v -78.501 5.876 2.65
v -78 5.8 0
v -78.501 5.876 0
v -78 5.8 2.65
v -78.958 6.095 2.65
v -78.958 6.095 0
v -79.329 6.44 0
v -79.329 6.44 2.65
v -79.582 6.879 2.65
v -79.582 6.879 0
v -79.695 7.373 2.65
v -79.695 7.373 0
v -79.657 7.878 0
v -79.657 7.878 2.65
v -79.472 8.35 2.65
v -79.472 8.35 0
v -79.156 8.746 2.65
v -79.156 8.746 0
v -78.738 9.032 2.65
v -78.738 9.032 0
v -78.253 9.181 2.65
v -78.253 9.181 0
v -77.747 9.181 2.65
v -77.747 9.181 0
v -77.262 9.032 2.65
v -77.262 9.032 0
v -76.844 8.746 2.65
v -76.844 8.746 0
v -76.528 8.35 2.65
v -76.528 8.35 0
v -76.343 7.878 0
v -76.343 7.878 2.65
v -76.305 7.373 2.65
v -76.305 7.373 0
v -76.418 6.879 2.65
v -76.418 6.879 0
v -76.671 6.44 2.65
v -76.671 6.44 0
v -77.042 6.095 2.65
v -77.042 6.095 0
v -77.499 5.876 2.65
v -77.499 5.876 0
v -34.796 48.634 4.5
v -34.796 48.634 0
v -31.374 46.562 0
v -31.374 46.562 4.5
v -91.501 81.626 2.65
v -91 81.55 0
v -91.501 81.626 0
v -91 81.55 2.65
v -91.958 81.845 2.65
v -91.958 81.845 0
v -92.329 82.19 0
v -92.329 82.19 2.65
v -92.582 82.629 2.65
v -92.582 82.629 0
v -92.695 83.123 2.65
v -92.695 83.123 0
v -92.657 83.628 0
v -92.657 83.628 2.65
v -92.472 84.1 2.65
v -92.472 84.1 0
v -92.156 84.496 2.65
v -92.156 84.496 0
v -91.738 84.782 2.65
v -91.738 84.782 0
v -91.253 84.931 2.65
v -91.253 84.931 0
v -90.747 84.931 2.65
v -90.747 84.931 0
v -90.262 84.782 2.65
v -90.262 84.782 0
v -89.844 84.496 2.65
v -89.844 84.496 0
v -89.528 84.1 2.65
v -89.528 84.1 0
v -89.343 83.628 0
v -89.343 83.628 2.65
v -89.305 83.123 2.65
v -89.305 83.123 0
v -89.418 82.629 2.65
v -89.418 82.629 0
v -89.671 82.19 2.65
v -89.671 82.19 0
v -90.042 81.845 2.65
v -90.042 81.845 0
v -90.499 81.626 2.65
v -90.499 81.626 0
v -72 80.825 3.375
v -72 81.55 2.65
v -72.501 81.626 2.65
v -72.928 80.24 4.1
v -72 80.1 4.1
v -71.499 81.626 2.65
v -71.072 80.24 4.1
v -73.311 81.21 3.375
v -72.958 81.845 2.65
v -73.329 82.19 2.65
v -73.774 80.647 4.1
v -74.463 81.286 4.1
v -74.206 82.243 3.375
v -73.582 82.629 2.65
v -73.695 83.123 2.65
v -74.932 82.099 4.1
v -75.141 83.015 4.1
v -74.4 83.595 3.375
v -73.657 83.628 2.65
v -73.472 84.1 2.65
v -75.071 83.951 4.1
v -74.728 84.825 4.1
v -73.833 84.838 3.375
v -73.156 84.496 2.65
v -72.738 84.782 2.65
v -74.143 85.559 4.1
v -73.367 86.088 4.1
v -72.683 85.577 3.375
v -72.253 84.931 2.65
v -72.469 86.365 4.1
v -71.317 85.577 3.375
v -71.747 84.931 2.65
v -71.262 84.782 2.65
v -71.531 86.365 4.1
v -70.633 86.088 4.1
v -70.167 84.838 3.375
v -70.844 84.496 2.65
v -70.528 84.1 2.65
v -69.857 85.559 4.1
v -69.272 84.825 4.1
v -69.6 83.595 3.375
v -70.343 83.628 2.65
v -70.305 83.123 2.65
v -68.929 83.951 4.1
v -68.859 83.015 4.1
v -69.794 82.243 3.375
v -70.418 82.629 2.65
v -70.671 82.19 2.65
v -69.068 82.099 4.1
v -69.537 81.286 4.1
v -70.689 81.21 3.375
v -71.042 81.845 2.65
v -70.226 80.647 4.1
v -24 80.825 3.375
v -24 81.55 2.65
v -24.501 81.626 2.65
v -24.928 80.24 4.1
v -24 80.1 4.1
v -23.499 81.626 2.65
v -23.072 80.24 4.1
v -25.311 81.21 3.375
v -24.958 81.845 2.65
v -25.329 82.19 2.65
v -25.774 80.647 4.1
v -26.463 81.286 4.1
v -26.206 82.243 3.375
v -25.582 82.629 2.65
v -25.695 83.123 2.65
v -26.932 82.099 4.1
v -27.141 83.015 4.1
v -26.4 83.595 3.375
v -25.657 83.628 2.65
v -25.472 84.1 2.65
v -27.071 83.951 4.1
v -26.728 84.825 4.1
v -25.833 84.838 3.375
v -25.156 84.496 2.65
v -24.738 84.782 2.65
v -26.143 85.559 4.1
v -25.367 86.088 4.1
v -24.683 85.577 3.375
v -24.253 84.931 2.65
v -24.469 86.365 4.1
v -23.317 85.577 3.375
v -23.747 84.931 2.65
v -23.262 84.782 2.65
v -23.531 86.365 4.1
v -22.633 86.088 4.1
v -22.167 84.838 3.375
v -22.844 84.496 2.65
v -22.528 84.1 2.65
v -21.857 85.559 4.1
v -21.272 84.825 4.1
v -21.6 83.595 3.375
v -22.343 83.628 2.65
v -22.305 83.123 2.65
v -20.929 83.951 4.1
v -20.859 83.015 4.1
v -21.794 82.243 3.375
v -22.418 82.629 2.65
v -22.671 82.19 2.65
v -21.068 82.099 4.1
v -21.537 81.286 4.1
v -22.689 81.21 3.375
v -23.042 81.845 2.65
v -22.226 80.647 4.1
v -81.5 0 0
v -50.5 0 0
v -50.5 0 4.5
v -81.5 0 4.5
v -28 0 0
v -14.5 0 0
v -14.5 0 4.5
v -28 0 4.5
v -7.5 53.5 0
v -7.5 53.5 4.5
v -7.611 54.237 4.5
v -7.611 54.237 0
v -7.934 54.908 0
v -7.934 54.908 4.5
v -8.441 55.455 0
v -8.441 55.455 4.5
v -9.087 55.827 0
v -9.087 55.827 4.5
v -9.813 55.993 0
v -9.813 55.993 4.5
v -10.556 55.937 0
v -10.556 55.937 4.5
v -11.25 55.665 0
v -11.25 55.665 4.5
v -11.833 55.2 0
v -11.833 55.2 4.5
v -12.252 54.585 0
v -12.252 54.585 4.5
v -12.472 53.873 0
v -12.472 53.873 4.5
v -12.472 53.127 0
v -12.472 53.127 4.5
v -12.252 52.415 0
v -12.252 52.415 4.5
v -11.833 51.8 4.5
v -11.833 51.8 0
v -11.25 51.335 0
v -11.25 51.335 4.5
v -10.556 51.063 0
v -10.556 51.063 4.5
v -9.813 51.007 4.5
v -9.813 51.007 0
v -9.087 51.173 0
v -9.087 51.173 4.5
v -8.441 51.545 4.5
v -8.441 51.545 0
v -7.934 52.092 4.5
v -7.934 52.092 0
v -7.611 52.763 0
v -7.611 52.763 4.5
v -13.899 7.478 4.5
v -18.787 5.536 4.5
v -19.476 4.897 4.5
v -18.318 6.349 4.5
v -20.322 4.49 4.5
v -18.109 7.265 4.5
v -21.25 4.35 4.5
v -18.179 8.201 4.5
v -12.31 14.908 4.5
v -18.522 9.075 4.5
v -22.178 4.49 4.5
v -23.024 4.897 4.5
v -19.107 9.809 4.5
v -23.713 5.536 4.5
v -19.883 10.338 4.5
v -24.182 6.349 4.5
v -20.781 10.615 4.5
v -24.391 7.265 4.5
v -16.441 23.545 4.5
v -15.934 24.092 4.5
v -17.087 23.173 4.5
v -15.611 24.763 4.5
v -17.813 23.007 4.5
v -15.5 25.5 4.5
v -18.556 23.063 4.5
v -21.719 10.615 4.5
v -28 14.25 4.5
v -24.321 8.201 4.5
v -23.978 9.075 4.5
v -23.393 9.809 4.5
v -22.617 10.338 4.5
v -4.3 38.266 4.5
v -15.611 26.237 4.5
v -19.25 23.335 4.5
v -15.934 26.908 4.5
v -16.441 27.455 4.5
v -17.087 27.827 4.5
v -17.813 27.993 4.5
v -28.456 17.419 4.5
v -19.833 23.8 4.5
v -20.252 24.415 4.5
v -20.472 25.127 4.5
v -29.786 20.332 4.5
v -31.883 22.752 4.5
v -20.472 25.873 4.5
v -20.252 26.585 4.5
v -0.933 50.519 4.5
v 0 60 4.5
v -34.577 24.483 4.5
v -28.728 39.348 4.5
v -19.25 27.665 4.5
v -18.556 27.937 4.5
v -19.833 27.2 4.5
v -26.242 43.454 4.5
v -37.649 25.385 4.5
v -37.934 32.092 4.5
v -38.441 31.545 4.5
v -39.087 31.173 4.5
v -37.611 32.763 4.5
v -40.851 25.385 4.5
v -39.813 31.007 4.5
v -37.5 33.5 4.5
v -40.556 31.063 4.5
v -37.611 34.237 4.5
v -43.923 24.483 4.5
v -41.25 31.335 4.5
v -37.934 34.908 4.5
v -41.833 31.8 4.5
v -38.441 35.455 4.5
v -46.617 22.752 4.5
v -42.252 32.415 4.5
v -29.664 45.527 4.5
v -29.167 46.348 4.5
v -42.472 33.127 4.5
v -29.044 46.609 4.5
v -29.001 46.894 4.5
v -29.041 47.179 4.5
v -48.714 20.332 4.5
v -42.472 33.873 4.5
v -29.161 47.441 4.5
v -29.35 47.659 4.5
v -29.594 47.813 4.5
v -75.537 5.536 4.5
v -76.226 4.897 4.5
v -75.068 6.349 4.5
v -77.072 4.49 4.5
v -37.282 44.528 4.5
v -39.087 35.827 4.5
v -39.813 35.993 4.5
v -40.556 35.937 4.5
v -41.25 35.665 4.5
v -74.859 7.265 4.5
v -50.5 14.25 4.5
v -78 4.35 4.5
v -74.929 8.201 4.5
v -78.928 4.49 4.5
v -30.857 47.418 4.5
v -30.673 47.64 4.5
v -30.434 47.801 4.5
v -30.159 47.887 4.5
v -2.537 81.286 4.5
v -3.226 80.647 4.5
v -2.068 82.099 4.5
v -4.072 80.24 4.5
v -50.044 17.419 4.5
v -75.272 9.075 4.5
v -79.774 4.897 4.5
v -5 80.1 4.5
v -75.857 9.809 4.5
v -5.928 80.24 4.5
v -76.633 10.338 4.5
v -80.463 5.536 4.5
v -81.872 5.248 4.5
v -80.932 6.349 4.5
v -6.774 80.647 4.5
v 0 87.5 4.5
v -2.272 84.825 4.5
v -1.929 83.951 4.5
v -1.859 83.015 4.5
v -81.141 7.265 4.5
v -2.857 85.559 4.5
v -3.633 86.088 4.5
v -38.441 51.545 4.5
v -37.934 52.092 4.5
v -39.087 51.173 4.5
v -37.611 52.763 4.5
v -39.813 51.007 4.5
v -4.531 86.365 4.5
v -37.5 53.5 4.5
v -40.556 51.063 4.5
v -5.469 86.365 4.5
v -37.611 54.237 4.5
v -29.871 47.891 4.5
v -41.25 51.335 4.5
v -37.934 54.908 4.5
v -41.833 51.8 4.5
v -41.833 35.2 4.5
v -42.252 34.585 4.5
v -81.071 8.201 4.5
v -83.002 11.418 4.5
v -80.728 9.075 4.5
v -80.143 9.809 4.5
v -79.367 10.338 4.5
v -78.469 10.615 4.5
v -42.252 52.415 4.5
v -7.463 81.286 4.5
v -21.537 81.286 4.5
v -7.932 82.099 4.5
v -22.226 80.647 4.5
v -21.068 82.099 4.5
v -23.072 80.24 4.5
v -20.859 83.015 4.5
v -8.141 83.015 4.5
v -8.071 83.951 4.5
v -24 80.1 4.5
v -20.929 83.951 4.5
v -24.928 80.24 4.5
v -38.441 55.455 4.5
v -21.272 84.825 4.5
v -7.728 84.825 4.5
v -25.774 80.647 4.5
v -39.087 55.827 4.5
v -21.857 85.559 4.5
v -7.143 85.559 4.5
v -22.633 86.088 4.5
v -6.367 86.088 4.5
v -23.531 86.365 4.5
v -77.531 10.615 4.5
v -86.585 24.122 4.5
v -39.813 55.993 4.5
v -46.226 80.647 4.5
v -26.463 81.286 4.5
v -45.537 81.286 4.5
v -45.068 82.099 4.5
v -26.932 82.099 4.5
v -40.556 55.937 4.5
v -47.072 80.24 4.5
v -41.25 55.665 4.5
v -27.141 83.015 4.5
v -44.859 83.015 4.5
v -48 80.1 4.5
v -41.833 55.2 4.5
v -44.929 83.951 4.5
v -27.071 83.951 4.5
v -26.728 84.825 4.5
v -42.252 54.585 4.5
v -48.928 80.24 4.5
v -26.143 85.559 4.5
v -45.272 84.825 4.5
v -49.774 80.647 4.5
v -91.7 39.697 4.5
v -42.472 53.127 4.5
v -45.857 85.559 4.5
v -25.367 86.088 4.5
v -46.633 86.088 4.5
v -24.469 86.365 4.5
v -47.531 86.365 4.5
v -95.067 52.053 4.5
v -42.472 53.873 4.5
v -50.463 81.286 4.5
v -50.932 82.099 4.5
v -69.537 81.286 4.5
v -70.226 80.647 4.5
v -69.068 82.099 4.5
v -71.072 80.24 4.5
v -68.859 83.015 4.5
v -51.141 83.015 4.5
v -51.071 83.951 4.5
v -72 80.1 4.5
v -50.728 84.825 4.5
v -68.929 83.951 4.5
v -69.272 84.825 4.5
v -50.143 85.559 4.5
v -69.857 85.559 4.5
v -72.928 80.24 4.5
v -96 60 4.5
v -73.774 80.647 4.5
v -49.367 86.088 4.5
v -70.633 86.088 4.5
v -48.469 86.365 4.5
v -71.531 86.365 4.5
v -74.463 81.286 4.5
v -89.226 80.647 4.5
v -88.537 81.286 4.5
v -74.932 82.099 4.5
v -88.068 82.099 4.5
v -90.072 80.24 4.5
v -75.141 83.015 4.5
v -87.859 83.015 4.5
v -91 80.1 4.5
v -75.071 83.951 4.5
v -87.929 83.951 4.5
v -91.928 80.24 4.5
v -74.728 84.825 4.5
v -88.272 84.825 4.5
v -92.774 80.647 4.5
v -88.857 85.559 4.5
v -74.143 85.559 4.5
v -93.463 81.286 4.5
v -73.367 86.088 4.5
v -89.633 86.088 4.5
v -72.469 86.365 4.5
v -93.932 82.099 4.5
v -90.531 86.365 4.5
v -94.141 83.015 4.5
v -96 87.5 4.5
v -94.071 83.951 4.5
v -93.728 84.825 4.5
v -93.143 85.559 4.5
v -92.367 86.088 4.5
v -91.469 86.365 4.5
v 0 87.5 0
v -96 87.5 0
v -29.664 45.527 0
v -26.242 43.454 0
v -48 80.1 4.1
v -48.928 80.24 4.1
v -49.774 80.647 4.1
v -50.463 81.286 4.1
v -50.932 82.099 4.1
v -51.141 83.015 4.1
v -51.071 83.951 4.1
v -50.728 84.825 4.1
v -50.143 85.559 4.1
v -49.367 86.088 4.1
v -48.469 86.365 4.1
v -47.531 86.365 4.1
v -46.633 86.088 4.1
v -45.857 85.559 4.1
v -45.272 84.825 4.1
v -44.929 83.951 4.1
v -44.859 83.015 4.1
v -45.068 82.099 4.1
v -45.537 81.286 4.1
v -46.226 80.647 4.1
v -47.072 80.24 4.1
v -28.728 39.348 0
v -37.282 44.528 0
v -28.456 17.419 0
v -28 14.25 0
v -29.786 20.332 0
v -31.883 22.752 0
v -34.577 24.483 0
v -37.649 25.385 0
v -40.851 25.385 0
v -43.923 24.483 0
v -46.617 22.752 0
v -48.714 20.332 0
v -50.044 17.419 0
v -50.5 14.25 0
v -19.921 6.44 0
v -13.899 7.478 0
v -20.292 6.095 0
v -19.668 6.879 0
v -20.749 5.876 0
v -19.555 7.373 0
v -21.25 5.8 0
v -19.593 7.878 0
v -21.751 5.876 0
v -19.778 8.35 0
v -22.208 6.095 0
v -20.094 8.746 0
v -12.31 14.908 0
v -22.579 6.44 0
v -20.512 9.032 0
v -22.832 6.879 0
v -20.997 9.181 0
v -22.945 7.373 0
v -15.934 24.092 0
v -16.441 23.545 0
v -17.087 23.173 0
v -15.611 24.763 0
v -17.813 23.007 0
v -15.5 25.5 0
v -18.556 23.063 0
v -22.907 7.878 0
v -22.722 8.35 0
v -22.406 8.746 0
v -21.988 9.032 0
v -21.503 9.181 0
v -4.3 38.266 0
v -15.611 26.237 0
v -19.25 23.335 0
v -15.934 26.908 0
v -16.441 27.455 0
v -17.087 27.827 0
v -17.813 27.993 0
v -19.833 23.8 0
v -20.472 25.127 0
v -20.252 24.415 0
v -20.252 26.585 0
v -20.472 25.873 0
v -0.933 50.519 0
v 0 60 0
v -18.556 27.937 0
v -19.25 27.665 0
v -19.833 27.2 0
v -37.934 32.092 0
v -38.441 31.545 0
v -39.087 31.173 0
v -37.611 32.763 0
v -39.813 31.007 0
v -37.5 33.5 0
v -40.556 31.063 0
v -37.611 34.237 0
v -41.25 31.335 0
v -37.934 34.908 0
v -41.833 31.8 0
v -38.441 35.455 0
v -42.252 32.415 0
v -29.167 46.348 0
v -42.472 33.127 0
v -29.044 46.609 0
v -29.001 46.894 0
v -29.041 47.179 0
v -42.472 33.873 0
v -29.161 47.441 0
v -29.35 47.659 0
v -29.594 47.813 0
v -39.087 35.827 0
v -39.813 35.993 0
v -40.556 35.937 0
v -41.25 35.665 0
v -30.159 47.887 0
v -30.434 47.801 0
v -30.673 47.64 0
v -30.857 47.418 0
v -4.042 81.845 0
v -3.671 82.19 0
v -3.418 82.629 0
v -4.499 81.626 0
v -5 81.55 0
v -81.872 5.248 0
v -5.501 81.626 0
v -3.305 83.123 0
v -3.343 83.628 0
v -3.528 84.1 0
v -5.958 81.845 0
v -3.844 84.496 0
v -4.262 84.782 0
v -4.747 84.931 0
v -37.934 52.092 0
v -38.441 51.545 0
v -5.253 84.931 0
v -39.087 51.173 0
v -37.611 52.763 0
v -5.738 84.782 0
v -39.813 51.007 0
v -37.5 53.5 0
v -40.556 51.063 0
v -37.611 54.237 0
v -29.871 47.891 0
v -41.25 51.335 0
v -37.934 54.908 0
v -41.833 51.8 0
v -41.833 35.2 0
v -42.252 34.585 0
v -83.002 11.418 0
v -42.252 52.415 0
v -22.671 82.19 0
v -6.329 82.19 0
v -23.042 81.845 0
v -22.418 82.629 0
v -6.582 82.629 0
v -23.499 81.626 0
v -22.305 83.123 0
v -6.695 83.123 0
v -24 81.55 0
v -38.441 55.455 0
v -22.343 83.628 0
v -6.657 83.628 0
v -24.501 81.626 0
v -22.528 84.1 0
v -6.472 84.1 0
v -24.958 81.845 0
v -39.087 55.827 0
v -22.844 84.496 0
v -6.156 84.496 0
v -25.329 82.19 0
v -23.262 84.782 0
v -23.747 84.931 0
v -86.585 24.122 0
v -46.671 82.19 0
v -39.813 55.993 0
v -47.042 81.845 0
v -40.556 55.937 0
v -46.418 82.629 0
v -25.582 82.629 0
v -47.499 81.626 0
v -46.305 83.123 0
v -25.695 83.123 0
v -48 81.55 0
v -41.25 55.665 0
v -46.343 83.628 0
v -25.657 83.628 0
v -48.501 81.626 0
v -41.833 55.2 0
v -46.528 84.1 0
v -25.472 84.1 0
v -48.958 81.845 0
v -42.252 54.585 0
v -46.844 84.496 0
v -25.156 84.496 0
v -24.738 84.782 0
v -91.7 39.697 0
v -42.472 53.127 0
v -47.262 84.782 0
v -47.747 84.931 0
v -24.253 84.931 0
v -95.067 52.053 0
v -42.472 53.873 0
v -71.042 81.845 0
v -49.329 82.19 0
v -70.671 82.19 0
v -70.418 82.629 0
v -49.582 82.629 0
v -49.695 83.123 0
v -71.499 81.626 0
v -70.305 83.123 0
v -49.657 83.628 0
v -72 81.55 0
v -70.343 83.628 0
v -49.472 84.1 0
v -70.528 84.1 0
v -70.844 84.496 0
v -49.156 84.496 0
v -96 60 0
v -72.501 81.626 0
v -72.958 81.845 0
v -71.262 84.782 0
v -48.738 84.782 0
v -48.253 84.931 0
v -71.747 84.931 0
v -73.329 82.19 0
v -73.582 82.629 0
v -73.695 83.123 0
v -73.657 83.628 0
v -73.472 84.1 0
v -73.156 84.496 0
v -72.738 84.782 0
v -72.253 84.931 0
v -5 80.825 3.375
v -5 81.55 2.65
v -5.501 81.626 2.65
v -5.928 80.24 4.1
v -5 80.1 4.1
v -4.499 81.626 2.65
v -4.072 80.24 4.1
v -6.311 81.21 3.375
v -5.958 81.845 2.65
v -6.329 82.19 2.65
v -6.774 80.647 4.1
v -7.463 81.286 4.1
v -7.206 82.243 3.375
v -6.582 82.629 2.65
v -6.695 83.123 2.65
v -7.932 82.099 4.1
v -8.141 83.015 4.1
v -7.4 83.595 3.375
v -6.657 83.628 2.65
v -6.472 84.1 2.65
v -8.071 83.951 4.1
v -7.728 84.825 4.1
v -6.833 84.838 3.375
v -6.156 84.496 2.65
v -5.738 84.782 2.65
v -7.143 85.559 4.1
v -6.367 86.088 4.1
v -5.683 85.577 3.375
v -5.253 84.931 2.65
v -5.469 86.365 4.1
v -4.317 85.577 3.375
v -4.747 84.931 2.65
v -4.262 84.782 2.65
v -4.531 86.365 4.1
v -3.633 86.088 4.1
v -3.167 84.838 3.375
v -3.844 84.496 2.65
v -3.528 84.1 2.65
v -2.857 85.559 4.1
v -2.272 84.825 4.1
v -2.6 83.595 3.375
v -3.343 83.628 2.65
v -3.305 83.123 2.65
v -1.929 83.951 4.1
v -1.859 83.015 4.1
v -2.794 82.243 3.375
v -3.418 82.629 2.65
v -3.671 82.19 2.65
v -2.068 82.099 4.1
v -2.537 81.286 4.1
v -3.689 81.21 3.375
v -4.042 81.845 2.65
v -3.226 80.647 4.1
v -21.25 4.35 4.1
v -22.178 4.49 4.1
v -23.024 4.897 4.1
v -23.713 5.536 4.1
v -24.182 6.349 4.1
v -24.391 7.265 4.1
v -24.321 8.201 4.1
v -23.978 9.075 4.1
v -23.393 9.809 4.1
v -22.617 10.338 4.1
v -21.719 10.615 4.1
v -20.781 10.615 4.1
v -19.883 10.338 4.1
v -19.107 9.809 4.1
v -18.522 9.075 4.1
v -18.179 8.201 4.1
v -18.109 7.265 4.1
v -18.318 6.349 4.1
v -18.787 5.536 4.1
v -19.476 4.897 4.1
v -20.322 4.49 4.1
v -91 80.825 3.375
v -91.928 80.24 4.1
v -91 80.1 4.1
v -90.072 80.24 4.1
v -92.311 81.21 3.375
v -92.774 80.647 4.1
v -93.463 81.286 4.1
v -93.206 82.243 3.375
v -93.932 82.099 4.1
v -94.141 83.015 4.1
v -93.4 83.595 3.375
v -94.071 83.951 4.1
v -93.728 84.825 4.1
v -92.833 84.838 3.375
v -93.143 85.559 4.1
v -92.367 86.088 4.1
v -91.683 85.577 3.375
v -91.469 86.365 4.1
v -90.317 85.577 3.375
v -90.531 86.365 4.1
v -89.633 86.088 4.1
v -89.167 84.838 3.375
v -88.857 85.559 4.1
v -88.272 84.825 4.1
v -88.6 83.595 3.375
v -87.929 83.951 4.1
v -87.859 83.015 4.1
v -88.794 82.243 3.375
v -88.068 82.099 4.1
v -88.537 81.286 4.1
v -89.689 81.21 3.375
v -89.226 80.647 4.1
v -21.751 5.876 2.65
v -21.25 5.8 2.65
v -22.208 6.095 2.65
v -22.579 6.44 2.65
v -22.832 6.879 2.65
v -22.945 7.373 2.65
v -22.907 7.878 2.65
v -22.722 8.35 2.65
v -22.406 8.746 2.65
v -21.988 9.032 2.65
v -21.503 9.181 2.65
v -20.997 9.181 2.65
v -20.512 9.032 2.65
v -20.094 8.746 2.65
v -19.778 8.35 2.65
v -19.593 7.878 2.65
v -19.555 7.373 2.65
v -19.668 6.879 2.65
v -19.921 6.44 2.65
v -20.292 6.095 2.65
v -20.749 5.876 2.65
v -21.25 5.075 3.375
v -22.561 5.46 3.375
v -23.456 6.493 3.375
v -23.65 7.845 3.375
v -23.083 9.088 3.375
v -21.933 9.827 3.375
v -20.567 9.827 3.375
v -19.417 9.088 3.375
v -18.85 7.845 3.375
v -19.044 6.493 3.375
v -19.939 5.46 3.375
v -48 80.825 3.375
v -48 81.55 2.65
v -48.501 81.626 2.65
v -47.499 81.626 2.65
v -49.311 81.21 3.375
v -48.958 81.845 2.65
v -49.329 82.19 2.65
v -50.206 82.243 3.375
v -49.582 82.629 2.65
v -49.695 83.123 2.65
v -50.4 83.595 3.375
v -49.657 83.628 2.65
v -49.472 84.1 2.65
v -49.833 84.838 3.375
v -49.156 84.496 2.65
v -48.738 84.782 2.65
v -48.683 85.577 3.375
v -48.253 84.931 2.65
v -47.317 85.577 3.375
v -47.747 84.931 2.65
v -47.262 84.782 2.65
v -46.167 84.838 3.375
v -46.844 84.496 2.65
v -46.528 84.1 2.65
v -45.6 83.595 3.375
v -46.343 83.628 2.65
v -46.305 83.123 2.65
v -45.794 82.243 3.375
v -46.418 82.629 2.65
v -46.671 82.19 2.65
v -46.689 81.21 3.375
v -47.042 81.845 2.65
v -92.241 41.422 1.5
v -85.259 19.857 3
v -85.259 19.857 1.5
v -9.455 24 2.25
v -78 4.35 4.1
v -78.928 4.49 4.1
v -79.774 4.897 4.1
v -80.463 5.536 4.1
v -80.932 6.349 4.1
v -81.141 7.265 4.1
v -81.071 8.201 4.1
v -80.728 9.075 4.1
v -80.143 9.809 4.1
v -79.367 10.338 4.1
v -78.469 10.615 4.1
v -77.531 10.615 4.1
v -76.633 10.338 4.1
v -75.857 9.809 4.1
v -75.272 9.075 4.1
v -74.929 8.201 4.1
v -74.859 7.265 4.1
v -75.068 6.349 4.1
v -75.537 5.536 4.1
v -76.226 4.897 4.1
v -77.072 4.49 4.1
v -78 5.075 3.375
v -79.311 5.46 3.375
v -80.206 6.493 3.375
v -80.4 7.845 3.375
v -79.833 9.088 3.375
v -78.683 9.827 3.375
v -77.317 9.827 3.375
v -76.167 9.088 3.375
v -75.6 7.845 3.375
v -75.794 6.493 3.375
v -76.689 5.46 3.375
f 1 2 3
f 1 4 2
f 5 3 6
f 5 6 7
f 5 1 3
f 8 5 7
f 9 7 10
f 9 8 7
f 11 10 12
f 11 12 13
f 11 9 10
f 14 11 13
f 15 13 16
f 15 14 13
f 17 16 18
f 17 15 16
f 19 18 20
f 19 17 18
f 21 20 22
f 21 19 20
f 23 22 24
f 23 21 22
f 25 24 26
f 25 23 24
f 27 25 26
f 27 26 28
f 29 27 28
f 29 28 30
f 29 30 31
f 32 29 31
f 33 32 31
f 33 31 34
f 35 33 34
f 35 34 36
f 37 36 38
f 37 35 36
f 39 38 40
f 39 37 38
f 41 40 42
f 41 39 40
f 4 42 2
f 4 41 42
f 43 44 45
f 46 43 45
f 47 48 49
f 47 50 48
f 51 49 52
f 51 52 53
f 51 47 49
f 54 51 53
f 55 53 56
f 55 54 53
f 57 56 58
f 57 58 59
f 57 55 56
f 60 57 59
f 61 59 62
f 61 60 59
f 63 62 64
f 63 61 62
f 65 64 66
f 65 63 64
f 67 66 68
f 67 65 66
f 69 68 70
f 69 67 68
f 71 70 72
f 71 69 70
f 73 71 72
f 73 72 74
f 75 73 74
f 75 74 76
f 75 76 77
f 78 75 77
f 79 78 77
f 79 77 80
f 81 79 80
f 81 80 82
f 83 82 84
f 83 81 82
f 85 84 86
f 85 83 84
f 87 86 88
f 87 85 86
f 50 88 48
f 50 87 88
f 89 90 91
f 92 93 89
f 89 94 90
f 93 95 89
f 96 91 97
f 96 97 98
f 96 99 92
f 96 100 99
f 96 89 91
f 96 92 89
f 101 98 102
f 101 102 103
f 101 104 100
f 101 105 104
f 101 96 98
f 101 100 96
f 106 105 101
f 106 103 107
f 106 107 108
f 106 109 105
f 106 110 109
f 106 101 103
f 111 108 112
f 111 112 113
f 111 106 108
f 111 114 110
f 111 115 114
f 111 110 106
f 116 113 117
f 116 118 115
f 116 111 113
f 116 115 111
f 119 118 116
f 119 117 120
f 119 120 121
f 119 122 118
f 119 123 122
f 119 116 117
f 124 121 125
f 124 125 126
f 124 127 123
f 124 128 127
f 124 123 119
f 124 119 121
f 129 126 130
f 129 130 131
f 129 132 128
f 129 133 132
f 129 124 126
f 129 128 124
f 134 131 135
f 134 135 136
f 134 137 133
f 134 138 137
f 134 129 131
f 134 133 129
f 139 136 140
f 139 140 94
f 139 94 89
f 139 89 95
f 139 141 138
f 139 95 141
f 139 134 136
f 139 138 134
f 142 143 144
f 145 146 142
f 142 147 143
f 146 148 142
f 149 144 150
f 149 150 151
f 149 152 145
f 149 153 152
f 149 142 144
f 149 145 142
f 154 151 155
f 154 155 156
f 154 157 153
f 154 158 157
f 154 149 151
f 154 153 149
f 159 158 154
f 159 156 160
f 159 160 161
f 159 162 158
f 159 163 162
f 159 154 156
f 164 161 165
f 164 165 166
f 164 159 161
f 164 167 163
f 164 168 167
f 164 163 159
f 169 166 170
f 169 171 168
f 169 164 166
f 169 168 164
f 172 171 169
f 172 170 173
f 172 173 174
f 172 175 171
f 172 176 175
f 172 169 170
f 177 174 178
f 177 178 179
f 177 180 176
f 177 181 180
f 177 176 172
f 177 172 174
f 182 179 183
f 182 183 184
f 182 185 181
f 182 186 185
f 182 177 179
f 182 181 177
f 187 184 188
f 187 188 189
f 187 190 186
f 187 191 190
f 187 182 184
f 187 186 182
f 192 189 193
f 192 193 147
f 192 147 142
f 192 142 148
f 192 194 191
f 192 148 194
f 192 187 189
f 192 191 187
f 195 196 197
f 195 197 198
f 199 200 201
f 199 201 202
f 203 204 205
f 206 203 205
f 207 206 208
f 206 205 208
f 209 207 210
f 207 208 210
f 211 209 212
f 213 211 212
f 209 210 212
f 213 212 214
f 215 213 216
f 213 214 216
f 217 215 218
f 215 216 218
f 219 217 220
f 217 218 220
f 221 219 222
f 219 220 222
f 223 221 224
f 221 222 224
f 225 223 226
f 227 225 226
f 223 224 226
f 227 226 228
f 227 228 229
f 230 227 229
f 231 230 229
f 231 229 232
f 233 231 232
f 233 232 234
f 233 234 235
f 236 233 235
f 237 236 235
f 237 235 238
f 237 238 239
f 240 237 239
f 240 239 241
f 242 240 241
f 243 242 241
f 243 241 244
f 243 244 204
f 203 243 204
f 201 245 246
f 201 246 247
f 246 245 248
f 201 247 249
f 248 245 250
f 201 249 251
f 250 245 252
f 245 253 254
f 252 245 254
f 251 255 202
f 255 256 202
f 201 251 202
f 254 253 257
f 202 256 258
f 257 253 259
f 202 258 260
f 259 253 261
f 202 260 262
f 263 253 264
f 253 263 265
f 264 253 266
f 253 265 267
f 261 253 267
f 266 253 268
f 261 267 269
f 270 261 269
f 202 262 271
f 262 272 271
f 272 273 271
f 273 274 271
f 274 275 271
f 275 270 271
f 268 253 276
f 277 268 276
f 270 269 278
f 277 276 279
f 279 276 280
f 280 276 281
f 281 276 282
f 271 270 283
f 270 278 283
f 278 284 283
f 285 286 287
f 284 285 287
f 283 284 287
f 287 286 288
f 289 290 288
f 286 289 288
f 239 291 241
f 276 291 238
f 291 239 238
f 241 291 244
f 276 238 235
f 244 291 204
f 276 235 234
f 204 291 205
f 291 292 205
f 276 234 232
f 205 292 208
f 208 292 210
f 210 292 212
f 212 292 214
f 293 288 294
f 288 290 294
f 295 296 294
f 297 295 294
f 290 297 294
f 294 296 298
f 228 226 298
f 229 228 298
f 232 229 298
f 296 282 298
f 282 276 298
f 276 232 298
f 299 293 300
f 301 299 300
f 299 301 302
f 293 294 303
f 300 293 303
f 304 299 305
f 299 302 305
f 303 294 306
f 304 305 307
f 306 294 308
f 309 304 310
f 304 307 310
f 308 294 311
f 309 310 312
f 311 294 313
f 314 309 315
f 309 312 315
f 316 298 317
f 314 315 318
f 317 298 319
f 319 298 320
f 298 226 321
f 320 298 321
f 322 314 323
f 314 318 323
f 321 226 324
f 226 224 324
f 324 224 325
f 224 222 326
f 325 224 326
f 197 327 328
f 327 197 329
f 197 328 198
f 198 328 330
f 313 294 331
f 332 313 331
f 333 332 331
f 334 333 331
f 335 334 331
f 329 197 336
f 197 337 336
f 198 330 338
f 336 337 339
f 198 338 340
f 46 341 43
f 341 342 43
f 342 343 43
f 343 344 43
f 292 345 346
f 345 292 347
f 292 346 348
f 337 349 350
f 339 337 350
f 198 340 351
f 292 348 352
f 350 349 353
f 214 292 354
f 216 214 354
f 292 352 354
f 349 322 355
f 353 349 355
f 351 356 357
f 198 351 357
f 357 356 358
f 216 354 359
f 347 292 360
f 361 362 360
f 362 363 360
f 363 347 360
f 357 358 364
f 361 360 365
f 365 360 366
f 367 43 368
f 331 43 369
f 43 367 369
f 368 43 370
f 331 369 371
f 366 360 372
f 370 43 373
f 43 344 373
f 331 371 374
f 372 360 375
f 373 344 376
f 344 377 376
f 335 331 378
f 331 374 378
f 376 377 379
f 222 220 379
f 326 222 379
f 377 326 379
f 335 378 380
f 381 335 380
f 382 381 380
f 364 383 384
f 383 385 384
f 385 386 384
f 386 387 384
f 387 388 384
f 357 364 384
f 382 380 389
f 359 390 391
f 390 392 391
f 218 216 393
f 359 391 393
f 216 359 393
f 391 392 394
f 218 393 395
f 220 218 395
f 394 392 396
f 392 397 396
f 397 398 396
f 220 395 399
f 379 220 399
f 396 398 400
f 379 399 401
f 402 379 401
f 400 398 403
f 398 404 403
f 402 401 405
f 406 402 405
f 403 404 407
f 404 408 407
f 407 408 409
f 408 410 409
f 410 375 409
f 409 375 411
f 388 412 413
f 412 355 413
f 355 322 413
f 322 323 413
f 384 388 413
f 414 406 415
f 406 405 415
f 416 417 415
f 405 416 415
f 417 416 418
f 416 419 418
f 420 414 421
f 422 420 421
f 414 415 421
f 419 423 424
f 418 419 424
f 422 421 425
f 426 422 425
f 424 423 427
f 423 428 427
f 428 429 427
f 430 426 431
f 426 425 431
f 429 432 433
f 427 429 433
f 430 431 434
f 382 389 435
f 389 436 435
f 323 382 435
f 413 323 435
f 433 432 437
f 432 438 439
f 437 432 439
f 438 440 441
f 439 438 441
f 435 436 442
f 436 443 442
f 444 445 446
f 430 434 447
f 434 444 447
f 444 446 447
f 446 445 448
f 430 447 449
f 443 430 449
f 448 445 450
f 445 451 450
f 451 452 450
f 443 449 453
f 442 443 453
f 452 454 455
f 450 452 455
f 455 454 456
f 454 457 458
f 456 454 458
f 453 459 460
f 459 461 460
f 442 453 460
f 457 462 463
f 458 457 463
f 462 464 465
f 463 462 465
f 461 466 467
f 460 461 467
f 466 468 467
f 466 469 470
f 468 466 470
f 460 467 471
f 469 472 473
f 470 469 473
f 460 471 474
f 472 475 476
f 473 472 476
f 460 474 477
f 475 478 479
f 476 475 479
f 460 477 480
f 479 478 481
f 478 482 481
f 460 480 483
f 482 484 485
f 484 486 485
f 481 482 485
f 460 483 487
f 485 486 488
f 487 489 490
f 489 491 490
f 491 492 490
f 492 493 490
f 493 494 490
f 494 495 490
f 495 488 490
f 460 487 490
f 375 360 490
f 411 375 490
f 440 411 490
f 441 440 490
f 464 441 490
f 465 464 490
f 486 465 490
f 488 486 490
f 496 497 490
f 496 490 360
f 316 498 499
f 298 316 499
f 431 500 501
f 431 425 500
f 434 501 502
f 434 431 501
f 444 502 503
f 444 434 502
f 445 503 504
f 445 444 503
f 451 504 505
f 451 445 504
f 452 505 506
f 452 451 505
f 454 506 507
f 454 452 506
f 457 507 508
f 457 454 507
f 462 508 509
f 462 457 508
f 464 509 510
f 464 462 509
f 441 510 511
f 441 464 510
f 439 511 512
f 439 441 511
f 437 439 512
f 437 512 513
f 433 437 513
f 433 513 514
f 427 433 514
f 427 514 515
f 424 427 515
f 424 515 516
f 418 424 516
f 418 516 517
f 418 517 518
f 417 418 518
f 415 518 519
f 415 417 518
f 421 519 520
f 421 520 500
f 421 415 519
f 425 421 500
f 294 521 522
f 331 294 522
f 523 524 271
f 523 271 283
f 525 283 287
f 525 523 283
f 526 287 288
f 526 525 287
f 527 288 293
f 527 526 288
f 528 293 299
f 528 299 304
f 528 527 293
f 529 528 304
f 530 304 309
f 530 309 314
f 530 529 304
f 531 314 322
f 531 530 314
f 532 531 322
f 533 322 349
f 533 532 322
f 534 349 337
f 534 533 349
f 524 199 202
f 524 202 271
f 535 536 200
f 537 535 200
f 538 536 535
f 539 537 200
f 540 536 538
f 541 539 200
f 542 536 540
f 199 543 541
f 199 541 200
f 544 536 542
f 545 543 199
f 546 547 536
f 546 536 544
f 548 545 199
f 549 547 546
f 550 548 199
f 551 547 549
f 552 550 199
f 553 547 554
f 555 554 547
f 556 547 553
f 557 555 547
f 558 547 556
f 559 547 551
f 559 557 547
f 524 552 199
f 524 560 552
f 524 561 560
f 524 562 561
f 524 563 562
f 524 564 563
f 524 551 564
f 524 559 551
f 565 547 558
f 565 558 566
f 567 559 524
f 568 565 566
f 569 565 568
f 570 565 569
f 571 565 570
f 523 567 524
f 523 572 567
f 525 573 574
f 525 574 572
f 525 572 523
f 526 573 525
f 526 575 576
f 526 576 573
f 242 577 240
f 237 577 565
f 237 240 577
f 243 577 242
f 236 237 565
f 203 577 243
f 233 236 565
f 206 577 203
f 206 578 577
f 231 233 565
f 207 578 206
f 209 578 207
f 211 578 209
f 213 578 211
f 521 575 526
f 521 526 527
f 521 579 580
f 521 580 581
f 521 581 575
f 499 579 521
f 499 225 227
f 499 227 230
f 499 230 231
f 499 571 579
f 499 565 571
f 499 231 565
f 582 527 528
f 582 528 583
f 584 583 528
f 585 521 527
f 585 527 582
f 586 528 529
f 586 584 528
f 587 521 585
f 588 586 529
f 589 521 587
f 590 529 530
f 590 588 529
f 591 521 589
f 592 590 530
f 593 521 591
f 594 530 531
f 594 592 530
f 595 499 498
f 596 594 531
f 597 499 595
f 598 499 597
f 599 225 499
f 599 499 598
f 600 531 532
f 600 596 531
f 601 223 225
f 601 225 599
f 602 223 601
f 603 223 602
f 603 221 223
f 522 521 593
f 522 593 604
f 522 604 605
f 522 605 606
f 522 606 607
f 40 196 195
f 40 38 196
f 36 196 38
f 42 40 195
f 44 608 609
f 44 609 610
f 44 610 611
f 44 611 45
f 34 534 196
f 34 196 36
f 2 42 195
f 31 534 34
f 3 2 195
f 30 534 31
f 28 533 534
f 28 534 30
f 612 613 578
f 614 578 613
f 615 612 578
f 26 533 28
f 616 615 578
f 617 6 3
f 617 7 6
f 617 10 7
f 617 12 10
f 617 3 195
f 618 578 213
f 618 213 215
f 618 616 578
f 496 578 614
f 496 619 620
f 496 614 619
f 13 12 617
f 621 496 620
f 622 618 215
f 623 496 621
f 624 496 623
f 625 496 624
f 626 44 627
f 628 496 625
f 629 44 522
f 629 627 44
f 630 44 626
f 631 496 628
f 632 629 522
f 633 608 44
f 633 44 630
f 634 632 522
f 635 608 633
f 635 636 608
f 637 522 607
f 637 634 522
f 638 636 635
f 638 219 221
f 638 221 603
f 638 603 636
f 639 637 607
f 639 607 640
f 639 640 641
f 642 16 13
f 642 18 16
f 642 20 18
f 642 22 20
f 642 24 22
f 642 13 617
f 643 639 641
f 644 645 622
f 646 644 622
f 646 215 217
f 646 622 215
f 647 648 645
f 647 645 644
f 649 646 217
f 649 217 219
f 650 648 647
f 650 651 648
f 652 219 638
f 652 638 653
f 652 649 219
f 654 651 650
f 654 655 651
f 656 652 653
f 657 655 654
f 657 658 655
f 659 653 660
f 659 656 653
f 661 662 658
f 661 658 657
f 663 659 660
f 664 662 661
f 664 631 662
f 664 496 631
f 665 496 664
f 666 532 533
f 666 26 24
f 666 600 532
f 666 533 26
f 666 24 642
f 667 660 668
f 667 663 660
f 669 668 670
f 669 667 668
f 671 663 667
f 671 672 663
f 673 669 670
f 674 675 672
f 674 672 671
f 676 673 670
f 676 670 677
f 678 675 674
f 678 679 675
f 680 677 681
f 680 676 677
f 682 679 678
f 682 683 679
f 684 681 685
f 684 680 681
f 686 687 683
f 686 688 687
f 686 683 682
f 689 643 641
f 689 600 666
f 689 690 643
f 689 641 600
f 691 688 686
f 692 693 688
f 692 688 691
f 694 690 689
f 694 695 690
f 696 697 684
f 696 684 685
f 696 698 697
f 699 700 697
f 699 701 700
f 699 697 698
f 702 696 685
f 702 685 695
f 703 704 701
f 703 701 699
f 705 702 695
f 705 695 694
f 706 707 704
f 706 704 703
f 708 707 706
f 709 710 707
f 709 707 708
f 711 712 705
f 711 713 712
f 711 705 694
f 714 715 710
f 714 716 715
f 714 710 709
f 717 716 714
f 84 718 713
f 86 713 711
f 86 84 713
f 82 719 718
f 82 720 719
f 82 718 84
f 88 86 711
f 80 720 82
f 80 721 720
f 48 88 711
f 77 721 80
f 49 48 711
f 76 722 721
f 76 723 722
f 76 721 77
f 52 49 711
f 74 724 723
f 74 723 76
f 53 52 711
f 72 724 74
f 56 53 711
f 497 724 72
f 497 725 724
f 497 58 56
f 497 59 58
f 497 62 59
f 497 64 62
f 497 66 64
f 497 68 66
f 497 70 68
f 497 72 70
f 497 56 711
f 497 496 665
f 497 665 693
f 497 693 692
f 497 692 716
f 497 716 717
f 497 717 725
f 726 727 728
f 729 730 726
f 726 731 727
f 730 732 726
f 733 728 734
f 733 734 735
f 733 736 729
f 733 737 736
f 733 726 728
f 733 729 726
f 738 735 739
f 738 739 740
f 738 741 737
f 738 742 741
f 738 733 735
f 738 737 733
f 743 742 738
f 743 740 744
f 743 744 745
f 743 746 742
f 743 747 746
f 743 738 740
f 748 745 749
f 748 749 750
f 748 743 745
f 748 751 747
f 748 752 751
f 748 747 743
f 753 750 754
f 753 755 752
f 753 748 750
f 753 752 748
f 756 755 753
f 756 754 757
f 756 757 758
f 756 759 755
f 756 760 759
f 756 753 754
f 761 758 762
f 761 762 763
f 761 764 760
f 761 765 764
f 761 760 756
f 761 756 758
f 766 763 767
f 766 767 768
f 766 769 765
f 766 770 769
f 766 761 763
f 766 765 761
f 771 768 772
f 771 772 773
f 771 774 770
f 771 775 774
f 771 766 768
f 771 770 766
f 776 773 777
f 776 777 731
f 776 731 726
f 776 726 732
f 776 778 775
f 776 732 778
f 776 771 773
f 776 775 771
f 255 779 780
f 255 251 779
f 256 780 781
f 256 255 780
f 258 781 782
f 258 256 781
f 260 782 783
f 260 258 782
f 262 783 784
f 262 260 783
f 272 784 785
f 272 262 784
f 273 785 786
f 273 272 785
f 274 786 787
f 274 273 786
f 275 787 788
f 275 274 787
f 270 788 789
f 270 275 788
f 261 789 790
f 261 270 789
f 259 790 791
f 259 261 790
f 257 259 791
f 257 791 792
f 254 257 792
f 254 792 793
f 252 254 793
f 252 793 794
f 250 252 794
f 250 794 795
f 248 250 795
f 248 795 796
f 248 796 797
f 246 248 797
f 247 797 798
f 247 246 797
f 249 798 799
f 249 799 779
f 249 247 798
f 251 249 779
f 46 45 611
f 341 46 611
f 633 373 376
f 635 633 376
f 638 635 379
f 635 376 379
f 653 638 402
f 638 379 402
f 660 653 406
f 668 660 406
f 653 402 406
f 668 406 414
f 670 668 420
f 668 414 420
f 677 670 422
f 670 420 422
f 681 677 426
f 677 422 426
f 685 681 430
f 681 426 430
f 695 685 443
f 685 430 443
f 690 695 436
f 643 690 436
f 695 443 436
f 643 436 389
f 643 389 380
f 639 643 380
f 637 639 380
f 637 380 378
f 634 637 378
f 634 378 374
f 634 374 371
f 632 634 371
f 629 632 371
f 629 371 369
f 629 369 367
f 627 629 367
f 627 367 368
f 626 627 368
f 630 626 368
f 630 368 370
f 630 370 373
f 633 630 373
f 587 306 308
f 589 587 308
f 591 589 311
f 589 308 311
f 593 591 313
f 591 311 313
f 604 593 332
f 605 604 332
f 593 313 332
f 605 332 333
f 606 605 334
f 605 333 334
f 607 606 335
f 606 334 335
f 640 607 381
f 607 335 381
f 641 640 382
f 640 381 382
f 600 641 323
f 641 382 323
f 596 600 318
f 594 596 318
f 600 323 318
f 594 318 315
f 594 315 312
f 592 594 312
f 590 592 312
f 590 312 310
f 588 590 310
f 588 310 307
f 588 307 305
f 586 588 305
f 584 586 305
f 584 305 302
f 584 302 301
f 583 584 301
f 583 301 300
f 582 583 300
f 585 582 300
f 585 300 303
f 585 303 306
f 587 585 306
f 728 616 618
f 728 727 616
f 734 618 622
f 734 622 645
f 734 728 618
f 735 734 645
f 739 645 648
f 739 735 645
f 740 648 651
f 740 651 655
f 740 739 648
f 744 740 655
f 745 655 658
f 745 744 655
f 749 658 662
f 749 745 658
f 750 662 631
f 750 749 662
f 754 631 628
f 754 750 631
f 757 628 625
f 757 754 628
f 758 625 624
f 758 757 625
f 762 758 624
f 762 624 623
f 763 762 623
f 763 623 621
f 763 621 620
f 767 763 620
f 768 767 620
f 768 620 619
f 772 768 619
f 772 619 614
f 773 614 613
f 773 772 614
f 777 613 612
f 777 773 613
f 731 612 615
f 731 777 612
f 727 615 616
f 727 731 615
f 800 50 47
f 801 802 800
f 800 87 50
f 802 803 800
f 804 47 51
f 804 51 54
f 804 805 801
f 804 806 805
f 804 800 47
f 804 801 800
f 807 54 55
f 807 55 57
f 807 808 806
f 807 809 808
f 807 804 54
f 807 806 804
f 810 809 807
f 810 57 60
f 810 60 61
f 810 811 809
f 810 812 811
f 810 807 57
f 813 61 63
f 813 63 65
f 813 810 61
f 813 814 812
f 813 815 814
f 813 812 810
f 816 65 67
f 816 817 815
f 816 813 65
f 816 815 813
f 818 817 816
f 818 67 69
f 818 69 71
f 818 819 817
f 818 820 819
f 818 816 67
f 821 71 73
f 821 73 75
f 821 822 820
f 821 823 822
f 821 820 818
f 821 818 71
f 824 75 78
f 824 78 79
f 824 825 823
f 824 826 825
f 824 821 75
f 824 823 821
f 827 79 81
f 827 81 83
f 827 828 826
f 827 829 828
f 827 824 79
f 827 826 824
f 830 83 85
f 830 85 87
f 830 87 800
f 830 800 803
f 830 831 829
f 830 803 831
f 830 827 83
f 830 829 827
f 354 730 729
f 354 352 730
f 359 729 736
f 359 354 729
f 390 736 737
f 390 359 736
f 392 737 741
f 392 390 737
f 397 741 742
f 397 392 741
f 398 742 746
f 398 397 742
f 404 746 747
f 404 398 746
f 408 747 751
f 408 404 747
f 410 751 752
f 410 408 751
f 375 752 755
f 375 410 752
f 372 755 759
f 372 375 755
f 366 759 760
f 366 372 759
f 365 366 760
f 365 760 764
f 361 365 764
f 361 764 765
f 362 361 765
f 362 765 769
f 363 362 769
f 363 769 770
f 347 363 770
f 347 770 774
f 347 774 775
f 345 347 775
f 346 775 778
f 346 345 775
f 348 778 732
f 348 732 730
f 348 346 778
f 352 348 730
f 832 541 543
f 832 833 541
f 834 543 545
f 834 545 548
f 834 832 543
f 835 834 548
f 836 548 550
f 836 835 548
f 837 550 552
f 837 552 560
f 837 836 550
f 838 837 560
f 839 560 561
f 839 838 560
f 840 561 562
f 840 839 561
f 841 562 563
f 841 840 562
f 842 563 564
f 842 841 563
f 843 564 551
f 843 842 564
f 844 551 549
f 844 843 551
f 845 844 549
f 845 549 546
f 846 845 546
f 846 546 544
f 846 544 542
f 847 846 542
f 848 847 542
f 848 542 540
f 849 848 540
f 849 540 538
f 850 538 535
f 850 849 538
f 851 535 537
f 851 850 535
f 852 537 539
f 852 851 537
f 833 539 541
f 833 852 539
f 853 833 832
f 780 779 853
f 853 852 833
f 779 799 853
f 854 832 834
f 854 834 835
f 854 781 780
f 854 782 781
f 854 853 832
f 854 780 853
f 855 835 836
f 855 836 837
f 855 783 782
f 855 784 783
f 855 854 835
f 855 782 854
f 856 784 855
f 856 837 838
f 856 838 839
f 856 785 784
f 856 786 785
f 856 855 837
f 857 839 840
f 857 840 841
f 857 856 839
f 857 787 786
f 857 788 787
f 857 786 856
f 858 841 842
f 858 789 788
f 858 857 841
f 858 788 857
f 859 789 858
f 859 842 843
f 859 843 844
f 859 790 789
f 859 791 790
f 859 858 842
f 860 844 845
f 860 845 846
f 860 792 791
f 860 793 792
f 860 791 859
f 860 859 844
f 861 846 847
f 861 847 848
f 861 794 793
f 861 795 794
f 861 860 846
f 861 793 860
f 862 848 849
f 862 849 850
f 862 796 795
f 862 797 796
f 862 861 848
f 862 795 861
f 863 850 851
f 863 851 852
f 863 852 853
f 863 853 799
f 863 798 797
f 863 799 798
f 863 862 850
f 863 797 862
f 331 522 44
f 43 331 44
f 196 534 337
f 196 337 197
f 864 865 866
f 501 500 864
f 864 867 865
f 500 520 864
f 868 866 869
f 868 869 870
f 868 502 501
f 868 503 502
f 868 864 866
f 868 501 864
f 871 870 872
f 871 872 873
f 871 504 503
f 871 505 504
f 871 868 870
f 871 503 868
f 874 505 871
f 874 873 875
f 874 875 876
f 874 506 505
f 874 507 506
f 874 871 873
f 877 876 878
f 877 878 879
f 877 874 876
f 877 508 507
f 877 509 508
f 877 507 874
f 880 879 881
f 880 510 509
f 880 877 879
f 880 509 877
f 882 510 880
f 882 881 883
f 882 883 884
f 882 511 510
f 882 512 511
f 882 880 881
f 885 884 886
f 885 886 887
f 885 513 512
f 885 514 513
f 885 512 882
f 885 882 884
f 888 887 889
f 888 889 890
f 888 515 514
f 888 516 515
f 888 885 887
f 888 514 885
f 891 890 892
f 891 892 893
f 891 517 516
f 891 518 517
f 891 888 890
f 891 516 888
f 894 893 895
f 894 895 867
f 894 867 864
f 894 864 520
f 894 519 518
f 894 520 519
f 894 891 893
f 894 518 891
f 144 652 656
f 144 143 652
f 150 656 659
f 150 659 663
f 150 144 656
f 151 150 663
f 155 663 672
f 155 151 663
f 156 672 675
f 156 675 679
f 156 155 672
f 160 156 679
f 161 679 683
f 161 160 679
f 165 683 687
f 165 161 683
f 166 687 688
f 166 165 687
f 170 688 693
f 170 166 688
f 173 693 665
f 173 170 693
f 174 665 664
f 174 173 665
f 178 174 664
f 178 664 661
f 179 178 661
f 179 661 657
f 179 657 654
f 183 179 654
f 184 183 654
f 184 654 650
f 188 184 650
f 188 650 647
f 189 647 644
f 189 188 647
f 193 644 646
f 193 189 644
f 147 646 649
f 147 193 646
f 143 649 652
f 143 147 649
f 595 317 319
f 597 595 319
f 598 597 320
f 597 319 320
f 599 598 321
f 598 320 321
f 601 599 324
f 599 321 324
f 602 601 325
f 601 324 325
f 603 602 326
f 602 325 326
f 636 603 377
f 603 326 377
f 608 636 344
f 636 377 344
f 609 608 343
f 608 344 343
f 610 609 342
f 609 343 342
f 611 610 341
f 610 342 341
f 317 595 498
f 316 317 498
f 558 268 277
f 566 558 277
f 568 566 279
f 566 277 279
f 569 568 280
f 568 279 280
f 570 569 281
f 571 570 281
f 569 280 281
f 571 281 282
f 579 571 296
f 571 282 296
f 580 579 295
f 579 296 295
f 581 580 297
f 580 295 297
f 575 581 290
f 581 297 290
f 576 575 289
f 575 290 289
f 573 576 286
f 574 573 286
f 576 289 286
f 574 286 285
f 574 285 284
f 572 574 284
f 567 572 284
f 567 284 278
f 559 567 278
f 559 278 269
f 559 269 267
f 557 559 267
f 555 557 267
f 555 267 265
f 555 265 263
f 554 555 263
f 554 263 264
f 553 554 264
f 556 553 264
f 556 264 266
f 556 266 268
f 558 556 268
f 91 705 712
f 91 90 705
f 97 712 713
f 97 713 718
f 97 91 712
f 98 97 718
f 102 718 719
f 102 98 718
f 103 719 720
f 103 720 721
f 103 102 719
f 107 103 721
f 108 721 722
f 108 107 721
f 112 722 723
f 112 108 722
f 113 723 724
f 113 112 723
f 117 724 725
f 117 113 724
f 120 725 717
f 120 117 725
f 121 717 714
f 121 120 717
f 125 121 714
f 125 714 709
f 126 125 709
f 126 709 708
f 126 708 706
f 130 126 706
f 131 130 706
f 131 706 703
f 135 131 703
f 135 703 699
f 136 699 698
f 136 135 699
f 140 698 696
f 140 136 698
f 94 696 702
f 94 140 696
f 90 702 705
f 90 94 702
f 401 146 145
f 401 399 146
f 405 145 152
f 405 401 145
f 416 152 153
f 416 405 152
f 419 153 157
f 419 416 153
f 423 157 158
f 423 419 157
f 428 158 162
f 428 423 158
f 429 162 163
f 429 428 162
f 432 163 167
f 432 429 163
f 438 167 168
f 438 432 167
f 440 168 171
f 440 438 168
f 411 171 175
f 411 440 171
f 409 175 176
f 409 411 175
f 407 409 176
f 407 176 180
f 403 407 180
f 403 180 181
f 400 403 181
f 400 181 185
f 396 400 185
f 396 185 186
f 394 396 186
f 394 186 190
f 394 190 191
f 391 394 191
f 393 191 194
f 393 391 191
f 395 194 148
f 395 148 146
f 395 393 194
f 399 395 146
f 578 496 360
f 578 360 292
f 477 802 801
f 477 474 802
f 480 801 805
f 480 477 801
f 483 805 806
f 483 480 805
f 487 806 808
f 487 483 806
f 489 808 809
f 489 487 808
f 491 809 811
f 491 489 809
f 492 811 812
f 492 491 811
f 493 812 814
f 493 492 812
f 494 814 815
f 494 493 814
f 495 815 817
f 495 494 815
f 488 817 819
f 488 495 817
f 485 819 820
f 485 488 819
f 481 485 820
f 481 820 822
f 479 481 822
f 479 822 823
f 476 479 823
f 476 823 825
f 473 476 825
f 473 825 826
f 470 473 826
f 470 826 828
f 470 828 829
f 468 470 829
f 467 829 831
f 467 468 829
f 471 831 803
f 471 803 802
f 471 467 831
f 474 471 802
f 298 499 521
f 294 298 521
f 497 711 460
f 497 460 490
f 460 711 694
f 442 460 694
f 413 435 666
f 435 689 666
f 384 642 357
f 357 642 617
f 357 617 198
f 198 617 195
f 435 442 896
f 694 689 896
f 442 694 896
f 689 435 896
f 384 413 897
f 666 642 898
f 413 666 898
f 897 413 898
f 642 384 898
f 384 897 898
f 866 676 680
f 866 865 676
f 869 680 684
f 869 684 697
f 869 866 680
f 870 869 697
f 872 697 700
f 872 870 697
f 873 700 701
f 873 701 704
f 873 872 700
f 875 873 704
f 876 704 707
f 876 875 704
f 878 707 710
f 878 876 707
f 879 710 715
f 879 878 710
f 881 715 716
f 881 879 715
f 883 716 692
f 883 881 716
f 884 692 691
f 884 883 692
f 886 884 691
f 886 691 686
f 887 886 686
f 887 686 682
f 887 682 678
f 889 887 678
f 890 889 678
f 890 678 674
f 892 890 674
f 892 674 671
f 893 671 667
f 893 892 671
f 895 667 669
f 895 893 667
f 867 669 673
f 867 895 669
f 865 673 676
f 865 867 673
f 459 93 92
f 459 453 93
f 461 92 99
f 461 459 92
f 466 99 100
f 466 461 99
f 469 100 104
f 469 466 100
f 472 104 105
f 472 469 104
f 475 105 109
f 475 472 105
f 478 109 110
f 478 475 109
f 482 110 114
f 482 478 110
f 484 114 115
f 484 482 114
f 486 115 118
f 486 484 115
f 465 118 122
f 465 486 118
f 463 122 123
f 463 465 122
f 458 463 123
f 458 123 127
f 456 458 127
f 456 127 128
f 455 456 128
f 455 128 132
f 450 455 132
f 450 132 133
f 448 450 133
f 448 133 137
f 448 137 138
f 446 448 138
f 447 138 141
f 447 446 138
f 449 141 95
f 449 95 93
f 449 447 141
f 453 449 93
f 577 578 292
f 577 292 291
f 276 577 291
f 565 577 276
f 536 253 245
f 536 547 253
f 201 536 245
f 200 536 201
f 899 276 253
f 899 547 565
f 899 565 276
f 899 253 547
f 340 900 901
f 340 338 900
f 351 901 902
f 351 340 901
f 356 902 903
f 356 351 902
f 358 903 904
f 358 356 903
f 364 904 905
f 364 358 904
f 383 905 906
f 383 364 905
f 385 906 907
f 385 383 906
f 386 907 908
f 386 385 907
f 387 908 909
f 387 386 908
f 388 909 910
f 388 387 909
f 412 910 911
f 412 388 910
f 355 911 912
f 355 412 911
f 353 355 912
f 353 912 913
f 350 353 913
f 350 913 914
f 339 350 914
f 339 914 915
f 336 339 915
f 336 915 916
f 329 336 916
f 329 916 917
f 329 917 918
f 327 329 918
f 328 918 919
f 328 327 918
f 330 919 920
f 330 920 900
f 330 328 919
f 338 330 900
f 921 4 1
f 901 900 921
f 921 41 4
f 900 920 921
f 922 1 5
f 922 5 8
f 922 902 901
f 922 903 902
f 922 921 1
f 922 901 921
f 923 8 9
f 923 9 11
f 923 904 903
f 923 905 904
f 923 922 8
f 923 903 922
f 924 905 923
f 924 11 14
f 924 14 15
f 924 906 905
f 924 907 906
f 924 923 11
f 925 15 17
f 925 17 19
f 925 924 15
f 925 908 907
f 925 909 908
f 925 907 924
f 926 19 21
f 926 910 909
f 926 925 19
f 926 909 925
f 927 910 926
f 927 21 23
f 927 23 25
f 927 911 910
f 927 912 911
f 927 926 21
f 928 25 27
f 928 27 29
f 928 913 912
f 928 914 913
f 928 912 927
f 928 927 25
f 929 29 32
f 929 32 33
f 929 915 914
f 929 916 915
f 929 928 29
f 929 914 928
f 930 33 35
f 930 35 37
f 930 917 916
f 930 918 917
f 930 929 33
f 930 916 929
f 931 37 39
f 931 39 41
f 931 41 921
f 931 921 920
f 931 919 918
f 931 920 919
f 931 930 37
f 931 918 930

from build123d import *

# Parameters (mm, degrees)
SKETCH1_R                                    = 1.5
BOSS_EXTRUDE1_DEPTH                          = 4.5
SKETCH2_R                                    = 2.5
CUT_EXTRUDE1_DEPTH                           = 130.97115079
SKETCH3_R                                    = 1
CUT_EXTRUDE2_DEPTH                           = 130.97115079
CUT_EXTRUDE3_DEPTH                           = 130.97115079
CSK_FOR_M3_COUNTERSUNK_FLAT_HEAD_SCR_2_COUNT = 2
CSK_FOR_M3_COUNTERSUNK_FLAT_HEAD_SCR_2_PITCH = 19
CSK_FOR_M3_COUNTERSUNK_FLAT_HEAD_SCR_3_COUNT = 2
CSK_FOR_M3_COUNTERSUNK_FLAT_HEAD_SCR_3_PITCH = 43
CSK_FOR_M3_COUNTERSUNK_FLAT_HEAD_SCR_4_COUNT = 2
CSK_FOR_M3_COUNTERSUNK_FLAT_HEAD_SCR_4_PITCH = 67
CSK_FOR_M3_COUNTERSUNK_FLAT_HEAD_SCR_5_COUNT = 2
CSK_FOR_M3_COUNTERSUNK_FLAT_HEAD_SCR_5_PITCH = 86
CSK_FOR_M3_COUNTERSUNK_FLAT_HEAD_SCR_6_COUNT = 2
CSK_FOR_M3_COUNTERSUNK_FLAT_HEAD_SCR_6_PITCH = 102.971476633
CSK_FOR_M3_COUNTERSUNK_FLAT_HEAD_SCR_7_COUNT = 2
CSK_FOR_M3_COUNTERSUNK_FLAT_HEAD_SCR_7_PITCH = 76.857416688


with BuildPart() as part:
    # Sketch1 → Boss-Extrude1 (new body)
    with BuildSketch(Plane.XY):
        with BuildLine():
            Line((-96, 87.5), (0, 87.5))
            Line((0, 87.5), (0, 60))
            add(Edge.make_bspline(
                [(0, 60), (0, 47.440932757), (-8.740761153, 28.351955076), (-14.5, 8.088351659), (-14.5, 0)],
                knots=[0, 0, 0, 0, 0.602811114, 1, 1, 1, 1], degree=3))
            Line((-14.5, 0), (-28, 0))
            Line((-28, 0), (-28, 14.25))
            ThreePointArc((-28, 14.25), (-39.25, 25.5), (-50.5, 14.25))
            Line((-50.5, 14.25), (-50.5, 0))
            Line((-50.5, 0), (-81.5, 0))
            add(Edge.make_bspline(
                [(-96, 60), (-96, 44.479329369), (-81.5, 17.438131956), (-81.5, 0)],
                knots=[0, 0, 0, 0, 1, 1, 1, 1], degree=3))
            Line((-96, 60), (-96, 87.5))
        make_face()
        with Locations((-91, 83.25)):
            Circle(SKETCH1_R, mode=Mode.SUBTRACT)
        with Locations((-72, 83.25)):
            Circle(SKETCH1_R, mode=Mode.SUBTRACT)
        with Locations((-48, 83.25)):
            Circle(SKETCH1_R, mode=Mode.SUBTRACT)
        with Locations((-5, 83.25)):
            Circle(SKETCH1_R, mode=Mode.SUBTRACT)
        with Locations((-24, 83.25)):
            Circle(SKETCH1_R, mode=Mode.SUBTRACT)
        with Locations((-21.25, 7.5)):
            Circle(SKETCH1_R, mode=Mode.SUBTRACT)
        with Locations((-78, 7.5)):
            Circle(SKETCH1_R, mode=Mode.SUBTRACT)
    extrude(amount=BOSS_EXTRUDE1_DEPTH)

    # Sketch2 → Cut-Extrude1 (cut, through all)
    with BuildSketch(Plane.XY.offset(4.5)):
        with Locations((-10, 53.5)):
            Circle(SKETCH2_R)
        with Locations((-40, 53.5)):
            Circle(SKETCH2_R)
        with Locations((-40, 33.5)):
            Circle(SKETCH2_R)
        with Locations((-18, 25.5)):
            Circle(SKETCH2_R)
    extrude(amount=-CUT_EXTRUDE1_DEPTH, mode=Mode.SUBTRACT)

    # Sketch3 → Cut-Extrude2 (cut, through all)
    with BuildSketch(Plane.XY.offset(4.5)):
        with Locations((-30.001125718, 46.899563619)):
            Circle(SKETCH3_R)
    extrude(amount=-CUT_EXTRUDE2_DEPTH, mode=Mode.SUBTRACT)

    # Sketch4 → Cut-Extrude3 (cut, through all)
    with BuildSketch(Plane(origin=(0, 0, 0), x_dir=(-1, 0, 0), z_dir=(0, 0, -1))):
        with BuildLine():
            Line((28.728353494, 39.348401399), (37.282344284, 44.528096521))
            Line((37.282344284, 44.528096521), (34.796090626, 48.634012101))
            Line((34.796090626, 48.634012101), (31.37449431, 46.562134052))
            Line((31.37449431, 46.562134052), (30.856524797, 47.417533131))
            ThreePointArc((30.856524797, 47.417533131), (29.500195325, 47.765051192), (29.125889015, 46.415868763))
            Line((29.125889015, 46.415868763), (29.664366906, 45.526601189))
            Line((29.664366906, 45.526601189), (26.242099835, 43.454316978))
            Line((26.242099835, 43.454316978), (28.728353494, 39.348401399))
        make_face()
    extrude(amount=-CUT_EXTRUDE3_DEPTH, mode=Mode.SUBTRACT)

    # Sketch6 → CSK for M3 Countersunk Flat Head Screw1 (revolve, cut)
    with BuildSketch(Plane(origin=(-91, 83.25, 4.5), x_dir=(0, -1, 0), z_dir=(1, 0, 0))):
        Polygon((0, 0), (0, 4.5), (1.7, 4.5), (1.7, 1.85), (3.15, 0.4), (3.15, 0), align=None)
    csk_for_m3_countersunk_flat_head_screw1 = revolve(axis=Axis((-91, 83.25, 10.85), (0, 0, -1)), mode=Mode.SUBTRACT)

    # CSK for M3 Countersunk Flat Head Scr 2: CSK for M3 Countersunk Flat Head Screw1 ×2
    with Locations(*[(i * CSK_FOR_M3_COUNTERSUNK_FLAT_HEAD_SCR_2_PITCH, 0, 0) for i in range(1, CSK_FOR_M3_COUNTERSUNK_FLAT_HEAD_SCR_2_COUNT)]):
        add(csk_for_m3_countersunk_flat_head_screw1, mode=Mode.SUBTRACT)

    # CSK for M3 Countersunk Flat Head Scr 3: CSK for M3 Countersunk Flat Head Screw1 ×2
    with Locations(*[(i * CSK_FOR_M3_COUNTERSUNK_FLAT_HEAD_SCR_3_PITCH, 0, 0) for i in range(1, CSK_FOR_M3_COUNTERSUNK_FLAT_HEAD_SCR_3_COUNT)]):
        add(csk_for_m3_countersunk_flat_head_screw1, mode=Mode.SUBTRACT)

    # CSK for M3 Countersunk Flat Head Scr 4: CSK for M3 Countersunk Flat Head Screw1 ×2
    with Locations(*[(i * CSK_FOR_M3_COUNTERSUNK_FLAT_HEAD_SCR_4_PITCH, 0, 0) for i in range(1, CSK_FOR_M3_COUNTERSUNK_FLAT_HEAD_SCR_4_COUNT)]):
        add(csk_for_m3_countersunk_flat_head_screw1, mode=Mode.SUBTRACT)

    # CSK for M3 Countersunk Flat Head Scr 5: CSK for M3 Countersunk Flat Head Screw1 ×2
    with Locations(*[(i * CSK_FOR_M3_COUNTERSUNK_FLAT_HEAD_SCR_5_PITCH, 0, 0) for i in range(1, CSK_FOR_M3_COUNTERSUNK_FLAT_HEAD_SCR_5_COUNT)]):
        add(csk_for_m3_countersunk_flat_head_screw1, mode=Mode.SUBTRACT)

    # CSK for M3 Countersunk Flat Head Scr 6: CSK for M3 Countersunk Flat Head Screw1 ×2
    with Locations(*[Vector(0.6773720478781835, -0.7356406111365222, 0) * (i * CSK_FOR_M3_COUNTERSUNK_FLAT_HEAD_SCR_6_PITCH) for i in range(1, CSK_FOR_M3_COUNTERSUNK_FLAT_HEAD_SCR_6_COUNT)]):
        add(csk_for_m3_countersunk_flat_head_screw1, mode=Mode.SUBTRACT)

    # CSK for M3 Countersunk Flat Head Scr 7: CSK for M3 Countersunk Flat Head Screw1 ×2
    with Locations(*[Vector(0.1691443787750649, -0.9855912840162485, 0) * (i * CSK_FOR_M3_COUNTERSUNK_FLAT_HEAD_SCR_7_PITCH) for i in range(1, CSK_FOR_M3_COUNTERSUNK_FLAT_HEAD_SCR_7_COUNT)]):
        add(csk_for_m3_countersunk_flat_head_screw1, mode=Mode.SUBTRACT)


solid = part.part
